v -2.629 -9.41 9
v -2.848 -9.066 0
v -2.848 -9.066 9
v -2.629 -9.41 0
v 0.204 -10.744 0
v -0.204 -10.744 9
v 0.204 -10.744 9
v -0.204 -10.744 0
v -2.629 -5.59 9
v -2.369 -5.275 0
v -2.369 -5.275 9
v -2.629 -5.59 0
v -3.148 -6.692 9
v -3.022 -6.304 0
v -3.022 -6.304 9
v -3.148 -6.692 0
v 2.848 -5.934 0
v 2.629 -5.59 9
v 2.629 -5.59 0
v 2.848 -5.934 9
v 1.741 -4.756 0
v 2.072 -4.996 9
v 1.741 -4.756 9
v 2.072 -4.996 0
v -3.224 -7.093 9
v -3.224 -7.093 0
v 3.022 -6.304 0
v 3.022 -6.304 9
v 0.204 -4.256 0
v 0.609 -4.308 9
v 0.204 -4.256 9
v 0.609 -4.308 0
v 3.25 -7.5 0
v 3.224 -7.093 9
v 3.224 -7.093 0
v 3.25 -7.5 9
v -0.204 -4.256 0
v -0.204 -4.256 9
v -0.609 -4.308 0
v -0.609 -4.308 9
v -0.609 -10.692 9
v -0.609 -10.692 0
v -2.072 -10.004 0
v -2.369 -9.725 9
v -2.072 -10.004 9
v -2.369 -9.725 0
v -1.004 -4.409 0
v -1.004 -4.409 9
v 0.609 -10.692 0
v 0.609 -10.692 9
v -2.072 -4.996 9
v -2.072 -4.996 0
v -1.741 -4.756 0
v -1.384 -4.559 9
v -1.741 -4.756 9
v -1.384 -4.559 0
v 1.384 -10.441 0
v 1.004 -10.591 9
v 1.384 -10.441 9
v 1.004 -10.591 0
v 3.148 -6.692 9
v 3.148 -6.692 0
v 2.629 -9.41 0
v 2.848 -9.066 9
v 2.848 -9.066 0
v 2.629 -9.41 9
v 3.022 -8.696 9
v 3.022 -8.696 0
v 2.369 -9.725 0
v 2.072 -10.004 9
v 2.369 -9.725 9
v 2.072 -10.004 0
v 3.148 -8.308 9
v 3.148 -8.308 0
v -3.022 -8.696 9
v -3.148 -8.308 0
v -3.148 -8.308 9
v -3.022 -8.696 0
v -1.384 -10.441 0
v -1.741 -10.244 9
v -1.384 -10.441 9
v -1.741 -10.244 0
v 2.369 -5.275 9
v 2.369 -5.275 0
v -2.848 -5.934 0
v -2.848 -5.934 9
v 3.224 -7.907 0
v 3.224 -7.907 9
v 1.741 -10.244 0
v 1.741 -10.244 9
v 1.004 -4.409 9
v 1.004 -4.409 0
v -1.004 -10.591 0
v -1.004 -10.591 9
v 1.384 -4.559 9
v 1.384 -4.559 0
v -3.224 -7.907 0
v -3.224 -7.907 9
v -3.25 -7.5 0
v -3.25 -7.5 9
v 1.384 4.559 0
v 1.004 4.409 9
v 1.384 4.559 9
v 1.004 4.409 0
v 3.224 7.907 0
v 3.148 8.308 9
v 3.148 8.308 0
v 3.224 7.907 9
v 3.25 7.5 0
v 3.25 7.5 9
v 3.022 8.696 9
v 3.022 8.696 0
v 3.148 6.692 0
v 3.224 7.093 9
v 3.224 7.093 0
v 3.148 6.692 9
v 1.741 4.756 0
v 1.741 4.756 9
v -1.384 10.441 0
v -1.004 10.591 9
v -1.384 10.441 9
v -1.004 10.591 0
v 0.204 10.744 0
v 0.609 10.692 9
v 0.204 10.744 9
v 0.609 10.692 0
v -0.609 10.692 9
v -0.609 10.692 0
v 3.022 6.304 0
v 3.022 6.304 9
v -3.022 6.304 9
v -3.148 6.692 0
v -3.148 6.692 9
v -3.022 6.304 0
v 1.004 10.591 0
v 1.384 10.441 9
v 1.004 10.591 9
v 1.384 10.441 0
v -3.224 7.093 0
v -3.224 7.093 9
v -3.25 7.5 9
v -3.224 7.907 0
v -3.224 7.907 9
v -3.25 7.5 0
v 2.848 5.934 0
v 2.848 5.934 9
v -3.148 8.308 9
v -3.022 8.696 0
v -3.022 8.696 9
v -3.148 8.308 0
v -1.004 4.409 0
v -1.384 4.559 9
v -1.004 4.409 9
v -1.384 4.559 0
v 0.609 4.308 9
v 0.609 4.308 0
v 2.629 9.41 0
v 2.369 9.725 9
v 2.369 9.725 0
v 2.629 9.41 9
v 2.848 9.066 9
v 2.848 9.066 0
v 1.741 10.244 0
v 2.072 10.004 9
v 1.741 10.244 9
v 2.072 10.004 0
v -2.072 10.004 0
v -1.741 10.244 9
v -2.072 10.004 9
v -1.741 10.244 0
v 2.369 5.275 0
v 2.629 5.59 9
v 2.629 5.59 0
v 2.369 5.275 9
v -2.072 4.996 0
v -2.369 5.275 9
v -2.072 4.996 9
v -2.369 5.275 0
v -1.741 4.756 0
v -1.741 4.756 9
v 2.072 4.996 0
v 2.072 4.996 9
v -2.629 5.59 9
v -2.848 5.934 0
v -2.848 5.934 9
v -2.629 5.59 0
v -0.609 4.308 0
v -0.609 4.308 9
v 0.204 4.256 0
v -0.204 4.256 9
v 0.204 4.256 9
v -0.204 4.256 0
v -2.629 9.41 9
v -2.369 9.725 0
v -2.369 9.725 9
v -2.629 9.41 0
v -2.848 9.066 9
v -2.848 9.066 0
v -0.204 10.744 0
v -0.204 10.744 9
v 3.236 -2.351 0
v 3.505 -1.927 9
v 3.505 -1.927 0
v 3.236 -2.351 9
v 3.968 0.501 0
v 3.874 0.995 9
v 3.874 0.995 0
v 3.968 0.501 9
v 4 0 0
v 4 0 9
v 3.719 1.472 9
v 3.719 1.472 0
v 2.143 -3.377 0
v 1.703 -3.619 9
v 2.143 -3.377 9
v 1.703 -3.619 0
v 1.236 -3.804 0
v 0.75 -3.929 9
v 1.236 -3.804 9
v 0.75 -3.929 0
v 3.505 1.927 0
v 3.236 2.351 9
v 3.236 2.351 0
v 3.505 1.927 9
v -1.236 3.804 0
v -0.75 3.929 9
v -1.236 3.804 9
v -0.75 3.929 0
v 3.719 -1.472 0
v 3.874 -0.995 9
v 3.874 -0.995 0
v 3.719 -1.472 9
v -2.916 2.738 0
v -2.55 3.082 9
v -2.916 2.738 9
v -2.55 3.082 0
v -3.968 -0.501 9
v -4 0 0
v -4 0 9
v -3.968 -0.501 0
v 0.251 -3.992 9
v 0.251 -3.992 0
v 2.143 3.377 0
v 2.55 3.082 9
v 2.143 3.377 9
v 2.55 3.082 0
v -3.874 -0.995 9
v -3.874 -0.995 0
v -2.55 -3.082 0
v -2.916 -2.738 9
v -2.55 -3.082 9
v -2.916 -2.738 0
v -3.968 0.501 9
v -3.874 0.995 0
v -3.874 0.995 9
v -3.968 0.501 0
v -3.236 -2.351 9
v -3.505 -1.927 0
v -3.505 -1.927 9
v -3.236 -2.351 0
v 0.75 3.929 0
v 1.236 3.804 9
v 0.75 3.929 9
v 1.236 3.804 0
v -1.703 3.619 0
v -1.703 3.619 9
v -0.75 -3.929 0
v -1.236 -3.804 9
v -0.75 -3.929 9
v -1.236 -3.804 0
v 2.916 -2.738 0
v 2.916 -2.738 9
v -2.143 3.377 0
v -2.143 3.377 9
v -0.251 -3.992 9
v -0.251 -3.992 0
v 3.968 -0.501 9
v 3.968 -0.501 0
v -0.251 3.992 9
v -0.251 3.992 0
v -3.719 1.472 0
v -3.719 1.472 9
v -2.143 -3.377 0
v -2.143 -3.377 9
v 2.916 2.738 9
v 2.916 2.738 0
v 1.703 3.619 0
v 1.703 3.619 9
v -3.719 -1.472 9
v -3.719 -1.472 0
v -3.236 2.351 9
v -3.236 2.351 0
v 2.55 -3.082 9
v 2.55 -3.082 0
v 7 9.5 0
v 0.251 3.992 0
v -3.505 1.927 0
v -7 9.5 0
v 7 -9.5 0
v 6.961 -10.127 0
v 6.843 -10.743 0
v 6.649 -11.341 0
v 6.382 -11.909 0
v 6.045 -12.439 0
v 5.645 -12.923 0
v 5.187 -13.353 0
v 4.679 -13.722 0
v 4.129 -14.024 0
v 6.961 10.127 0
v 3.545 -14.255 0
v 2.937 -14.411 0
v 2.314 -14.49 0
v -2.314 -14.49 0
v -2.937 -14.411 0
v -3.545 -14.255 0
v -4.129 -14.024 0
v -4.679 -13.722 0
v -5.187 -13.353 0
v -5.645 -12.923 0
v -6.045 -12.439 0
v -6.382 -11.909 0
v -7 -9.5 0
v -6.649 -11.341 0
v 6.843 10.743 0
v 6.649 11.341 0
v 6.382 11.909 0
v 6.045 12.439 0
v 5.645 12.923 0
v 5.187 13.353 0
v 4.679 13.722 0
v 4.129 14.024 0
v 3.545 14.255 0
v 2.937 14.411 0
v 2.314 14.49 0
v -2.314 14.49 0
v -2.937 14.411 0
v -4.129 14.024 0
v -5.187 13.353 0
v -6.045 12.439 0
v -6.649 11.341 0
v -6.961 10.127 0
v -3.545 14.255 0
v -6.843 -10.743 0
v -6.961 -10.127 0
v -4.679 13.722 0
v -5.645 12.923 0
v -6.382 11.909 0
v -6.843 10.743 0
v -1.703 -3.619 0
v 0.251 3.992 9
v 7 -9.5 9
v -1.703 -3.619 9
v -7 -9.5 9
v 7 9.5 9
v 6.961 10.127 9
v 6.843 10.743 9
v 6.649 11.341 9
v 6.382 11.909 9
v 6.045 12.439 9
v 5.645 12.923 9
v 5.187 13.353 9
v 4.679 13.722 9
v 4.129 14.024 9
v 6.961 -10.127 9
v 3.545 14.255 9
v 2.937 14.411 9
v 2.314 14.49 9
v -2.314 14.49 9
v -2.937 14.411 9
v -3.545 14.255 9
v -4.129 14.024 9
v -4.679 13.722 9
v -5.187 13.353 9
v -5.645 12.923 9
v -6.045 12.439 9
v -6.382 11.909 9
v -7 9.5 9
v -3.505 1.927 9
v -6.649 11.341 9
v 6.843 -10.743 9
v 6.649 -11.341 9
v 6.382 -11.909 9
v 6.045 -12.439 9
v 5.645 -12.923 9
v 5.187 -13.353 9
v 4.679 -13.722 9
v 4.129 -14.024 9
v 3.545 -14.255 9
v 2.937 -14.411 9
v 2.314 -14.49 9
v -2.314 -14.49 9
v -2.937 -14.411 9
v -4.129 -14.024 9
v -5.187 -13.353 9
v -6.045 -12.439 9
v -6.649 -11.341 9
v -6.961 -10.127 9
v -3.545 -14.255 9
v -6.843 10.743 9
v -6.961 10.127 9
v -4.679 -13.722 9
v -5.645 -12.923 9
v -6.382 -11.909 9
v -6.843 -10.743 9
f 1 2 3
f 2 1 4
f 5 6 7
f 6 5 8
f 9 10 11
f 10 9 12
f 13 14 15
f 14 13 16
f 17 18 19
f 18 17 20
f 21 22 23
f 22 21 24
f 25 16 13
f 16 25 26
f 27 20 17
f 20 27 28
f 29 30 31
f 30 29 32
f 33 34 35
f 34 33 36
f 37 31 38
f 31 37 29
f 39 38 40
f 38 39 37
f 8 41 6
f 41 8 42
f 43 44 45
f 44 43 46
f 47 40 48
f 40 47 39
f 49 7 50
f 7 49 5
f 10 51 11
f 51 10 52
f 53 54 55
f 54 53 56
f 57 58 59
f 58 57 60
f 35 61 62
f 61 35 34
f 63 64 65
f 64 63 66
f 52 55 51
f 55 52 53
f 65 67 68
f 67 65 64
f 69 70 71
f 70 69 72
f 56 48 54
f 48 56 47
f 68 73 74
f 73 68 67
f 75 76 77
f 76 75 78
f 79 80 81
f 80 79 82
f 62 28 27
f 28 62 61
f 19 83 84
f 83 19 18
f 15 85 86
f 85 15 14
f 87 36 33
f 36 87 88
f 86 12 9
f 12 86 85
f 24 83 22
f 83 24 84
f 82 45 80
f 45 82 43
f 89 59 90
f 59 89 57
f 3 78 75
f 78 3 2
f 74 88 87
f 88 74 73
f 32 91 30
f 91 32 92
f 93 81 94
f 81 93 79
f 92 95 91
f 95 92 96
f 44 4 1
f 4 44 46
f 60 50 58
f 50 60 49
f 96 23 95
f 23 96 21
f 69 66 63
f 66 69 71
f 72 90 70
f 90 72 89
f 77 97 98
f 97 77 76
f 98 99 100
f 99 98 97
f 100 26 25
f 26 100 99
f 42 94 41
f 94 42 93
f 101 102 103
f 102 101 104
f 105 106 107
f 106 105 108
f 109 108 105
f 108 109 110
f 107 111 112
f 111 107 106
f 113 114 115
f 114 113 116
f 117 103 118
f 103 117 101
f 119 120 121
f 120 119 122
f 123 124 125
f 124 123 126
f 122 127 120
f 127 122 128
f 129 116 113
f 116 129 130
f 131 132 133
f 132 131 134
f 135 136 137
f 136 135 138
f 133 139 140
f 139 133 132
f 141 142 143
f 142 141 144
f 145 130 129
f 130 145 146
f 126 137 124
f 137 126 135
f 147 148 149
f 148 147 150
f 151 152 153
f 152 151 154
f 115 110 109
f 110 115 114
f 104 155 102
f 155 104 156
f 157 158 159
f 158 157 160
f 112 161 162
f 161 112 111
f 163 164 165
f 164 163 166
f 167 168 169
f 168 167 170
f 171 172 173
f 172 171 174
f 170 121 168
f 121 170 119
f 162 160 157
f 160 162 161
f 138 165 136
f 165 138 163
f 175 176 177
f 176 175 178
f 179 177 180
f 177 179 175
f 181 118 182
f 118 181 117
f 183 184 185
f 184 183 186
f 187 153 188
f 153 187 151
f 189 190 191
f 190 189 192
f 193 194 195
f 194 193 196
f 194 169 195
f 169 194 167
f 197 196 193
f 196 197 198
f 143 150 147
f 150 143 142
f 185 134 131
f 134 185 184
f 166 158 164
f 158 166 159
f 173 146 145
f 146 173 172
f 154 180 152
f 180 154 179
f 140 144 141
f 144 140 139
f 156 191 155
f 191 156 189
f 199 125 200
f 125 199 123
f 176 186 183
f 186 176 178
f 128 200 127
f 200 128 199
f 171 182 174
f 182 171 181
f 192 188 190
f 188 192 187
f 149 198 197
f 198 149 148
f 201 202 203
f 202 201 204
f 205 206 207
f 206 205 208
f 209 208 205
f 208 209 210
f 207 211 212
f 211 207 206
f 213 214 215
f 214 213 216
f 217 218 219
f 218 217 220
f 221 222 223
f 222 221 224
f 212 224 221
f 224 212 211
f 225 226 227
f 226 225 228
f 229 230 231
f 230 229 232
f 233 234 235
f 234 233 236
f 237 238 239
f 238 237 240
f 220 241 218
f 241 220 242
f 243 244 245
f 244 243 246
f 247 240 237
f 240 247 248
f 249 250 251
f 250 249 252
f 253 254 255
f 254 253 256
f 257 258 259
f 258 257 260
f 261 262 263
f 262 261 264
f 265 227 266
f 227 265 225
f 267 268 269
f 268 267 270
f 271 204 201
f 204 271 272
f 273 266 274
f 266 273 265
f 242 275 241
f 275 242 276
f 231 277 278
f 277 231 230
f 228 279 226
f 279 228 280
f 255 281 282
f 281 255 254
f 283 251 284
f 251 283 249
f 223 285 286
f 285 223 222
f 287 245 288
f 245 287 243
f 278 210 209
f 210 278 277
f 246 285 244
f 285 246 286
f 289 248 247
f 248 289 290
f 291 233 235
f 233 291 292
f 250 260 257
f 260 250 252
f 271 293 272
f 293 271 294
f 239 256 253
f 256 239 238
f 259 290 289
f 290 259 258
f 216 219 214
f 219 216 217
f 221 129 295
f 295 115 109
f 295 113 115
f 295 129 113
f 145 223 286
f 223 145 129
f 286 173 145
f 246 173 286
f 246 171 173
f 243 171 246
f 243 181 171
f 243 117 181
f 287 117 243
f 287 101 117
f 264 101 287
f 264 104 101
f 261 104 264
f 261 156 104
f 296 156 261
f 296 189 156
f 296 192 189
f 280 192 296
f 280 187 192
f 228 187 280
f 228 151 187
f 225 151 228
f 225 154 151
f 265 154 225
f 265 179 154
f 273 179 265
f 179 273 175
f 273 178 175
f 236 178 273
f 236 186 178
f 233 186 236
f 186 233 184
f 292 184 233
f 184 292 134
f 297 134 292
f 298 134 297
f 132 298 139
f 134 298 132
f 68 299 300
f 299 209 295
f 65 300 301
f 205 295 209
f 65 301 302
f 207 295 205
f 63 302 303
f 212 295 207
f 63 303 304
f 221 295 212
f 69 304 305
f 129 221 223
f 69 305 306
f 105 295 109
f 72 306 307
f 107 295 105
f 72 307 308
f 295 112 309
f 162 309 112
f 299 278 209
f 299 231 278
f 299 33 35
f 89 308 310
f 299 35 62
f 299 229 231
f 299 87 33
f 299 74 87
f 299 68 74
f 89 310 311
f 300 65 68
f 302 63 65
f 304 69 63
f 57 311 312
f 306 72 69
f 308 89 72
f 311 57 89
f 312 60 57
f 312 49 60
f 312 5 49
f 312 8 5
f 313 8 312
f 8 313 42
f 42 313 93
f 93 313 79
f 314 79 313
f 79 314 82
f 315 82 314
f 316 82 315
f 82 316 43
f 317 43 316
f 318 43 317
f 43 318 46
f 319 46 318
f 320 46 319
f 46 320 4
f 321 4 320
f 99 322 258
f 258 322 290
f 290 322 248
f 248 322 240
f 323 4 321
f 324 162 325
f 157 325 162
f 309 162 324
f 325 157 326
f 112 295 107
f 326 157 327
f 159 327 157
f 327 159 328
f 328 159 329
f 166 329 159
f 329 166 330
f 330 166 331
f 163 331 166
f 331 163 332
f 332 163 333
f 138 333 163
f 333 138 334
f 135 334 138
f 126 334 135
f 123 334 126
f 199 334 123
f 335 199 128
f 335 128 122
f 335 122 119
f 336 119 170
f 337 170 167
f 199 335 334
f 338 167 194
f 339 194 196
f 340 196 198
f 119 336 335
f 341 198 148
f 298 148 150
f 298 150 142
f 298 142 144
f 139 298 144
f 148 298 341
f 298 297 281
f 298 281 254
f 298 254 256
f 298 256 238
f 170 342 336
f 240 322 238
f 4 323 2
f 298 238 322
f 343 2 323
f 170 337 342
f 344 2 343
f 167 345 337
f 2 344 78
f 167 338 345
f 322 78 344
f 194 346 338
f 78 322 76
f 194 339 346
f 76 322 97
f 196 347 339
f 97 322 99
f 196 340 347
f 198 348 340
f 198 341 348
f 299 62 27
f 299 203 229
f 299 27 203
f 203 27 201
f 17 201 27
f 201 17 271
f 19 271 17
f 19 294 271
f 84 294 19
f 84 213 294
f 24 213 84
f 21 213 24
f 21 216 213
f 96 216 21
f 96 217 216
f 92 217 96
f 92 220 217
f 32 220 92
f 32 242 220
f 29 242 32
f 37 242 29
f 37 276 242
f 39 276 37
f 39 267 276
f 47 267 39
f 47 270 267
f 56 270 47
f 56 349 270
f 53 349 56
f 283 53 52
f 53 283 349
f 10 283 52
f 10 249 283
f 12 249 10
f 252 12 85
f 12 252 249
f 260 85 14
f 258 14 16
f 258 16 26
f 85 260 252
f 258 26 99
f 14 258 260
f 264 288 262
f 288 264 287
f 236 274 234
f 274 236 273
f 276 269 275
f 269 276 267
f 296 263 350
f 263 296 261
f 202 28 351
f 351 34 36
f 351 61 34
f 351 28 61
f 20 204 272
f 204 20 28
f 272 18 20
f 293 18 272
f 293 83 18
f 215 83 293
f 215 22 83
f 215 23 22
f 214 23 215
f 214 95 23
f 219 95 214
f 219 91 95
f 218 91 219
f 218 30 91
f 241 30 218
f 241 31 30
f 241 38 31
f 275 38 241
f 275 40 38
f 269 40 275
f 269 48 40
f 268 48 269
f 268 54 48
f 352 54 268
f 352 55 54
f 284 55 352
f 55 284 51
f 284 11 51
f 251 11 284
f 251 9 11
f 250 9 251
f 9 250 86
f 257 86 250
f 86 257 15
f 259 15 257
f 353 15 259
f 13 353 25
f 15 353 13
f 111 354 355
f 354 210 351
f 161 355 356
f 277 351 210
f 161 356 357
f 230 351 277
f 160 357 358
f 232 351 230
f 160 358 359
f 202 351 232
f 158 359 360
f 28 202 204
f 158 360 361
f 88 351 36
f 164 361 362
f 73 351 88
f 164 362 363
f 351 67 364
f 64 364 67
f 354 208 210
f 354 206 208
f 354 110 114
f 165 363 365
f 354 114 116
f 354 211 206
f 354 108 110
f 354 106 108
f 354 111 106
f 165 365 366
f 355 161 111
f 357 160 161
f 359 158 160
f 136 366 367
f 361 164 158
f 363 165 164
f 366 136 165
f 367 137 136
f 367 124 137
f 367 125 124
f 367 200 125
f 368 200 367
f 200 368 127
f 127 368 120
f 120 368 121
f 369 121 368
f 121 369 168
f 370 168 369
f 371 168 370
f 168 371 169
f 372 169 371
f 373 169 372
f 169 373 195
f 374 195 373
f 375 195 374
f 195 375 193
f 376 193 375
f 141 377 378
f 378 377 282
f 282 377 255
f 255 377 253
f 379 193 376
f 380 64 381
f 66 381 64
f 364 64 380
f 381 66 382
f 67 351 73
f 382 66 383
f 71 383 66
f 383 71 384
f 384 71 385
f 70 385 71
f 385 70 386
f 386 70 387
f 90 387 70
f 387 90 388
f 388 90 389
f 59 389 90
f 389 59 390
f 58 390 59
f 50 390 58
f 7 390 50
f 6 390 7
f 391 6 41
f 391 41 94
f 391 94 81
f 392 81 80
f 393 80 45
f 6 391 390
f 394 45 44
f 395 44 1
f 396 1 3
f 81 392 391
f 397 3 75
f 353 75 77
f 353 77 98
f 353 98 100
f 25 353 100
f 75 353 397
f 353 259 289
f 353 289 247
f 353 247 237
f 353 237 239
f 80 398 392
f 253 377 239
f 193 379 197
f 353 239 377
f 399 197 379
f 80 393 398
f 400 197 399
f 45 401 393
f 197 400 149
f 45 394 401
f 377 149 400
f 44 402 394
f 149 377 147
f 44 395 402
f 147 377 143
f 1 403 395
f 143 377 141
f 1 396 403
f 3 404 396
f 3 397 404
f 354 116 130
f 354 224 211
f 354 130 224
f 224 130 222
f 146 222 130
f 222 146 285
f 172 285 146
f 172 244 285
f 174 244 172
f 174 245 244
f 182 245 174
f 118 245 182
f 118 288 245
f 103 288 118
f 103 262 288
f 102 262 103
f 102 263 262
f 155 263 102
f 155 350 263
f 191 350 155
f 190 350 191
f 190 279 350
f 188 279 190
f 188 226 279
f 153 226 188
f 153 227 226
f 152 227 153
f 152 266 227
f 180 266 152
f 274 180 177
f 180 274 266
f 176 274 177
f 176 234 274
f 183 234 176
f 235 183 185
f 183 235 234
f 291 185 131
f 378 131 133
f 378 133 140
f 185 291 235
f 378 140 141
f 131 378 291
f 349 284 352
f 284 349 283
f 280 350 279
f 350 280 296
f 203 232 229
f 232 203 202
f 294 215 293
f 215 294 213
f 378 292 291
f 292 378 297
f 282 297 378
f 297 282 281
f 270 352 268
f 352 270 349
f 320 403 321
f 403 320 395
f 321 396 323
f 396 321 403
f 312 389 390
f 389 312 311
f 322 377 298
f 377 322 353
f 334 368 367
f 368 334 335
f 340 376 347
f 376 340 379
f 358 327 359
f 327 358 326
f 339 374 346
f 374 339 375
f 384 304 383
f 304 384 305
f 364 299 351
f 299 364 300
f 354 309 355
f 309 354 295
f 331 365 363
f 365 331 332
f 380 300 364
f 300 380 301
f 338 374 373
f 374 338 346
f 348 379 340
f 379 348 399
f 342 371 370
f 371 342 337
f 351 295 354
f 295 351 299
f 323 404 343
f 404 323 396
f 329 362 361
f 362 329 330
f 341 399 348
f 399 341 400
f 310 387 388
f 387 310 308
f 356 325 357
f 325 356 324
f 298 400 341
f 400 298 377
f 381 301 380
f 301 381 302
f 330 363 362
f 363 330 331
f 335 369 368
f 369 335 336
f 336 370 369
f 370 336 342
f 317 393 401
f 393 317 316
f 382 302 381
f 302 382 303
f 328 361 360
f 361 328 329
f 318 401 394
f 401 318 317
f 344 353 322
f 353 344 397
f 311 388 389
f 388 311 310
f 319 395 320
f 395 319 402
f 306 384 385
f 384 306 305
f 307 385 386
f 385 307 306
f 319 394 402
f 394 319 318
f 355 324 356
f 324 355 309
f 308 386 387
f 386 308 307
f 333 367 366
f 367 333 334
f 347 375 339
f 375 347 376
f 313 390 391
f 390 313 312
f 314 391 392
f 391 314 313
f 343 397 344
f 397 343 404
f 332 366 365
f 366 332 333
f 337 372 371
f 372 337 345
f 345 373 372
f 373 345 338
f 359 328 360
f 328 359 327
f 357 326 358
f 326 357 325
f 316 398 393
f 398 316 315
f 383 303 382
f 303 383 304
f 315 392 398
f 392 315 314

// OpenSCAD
$fn = 50;


difference() {
	union() {
		hull() {
			translate(v = [-2.0000000000, 9.5000000000, 0]) {
				cylinder(h = 9, r = 5);
			}
			translate(v = [2.0000000000, 9.5000000000, 0]) {
				cylinder(h = 9, r = 5);
			}
			translate(v = [-2.0000000000, -9.5000000000, 0]) {
				cylinder(h = 9, r = 5);
			}
			translate(v = [2.0000000000, -9.5000000000, 0]) {
				cylinder(h = 9, r = 5);
			}
		}
	}
	union() {
		#translate(v = [0.0000000000, -7.5000000000, -100.0000000000]) {
			cylinder(h = 200, r = 3.2500000000);
		}
		#translate(v = [0.0000000000, -7.5000000000, -100.0000000000]) {
			cylinder(h = 200, r = 3.2500000000);
		}
		#translate(v = [0.0000000000, 7.5000000000, -100.0000000000]) {
			cylinder(h = 200, r = 3.2500000000);
		}
		#translate(v = [0.0000000000, 7.5000000000, -100.0000000000]) {
			cylinder(h = 200, r = 3.2500000000);
		}
		#cylinder(h = 9, r = 4.0000000000);
	}
}
